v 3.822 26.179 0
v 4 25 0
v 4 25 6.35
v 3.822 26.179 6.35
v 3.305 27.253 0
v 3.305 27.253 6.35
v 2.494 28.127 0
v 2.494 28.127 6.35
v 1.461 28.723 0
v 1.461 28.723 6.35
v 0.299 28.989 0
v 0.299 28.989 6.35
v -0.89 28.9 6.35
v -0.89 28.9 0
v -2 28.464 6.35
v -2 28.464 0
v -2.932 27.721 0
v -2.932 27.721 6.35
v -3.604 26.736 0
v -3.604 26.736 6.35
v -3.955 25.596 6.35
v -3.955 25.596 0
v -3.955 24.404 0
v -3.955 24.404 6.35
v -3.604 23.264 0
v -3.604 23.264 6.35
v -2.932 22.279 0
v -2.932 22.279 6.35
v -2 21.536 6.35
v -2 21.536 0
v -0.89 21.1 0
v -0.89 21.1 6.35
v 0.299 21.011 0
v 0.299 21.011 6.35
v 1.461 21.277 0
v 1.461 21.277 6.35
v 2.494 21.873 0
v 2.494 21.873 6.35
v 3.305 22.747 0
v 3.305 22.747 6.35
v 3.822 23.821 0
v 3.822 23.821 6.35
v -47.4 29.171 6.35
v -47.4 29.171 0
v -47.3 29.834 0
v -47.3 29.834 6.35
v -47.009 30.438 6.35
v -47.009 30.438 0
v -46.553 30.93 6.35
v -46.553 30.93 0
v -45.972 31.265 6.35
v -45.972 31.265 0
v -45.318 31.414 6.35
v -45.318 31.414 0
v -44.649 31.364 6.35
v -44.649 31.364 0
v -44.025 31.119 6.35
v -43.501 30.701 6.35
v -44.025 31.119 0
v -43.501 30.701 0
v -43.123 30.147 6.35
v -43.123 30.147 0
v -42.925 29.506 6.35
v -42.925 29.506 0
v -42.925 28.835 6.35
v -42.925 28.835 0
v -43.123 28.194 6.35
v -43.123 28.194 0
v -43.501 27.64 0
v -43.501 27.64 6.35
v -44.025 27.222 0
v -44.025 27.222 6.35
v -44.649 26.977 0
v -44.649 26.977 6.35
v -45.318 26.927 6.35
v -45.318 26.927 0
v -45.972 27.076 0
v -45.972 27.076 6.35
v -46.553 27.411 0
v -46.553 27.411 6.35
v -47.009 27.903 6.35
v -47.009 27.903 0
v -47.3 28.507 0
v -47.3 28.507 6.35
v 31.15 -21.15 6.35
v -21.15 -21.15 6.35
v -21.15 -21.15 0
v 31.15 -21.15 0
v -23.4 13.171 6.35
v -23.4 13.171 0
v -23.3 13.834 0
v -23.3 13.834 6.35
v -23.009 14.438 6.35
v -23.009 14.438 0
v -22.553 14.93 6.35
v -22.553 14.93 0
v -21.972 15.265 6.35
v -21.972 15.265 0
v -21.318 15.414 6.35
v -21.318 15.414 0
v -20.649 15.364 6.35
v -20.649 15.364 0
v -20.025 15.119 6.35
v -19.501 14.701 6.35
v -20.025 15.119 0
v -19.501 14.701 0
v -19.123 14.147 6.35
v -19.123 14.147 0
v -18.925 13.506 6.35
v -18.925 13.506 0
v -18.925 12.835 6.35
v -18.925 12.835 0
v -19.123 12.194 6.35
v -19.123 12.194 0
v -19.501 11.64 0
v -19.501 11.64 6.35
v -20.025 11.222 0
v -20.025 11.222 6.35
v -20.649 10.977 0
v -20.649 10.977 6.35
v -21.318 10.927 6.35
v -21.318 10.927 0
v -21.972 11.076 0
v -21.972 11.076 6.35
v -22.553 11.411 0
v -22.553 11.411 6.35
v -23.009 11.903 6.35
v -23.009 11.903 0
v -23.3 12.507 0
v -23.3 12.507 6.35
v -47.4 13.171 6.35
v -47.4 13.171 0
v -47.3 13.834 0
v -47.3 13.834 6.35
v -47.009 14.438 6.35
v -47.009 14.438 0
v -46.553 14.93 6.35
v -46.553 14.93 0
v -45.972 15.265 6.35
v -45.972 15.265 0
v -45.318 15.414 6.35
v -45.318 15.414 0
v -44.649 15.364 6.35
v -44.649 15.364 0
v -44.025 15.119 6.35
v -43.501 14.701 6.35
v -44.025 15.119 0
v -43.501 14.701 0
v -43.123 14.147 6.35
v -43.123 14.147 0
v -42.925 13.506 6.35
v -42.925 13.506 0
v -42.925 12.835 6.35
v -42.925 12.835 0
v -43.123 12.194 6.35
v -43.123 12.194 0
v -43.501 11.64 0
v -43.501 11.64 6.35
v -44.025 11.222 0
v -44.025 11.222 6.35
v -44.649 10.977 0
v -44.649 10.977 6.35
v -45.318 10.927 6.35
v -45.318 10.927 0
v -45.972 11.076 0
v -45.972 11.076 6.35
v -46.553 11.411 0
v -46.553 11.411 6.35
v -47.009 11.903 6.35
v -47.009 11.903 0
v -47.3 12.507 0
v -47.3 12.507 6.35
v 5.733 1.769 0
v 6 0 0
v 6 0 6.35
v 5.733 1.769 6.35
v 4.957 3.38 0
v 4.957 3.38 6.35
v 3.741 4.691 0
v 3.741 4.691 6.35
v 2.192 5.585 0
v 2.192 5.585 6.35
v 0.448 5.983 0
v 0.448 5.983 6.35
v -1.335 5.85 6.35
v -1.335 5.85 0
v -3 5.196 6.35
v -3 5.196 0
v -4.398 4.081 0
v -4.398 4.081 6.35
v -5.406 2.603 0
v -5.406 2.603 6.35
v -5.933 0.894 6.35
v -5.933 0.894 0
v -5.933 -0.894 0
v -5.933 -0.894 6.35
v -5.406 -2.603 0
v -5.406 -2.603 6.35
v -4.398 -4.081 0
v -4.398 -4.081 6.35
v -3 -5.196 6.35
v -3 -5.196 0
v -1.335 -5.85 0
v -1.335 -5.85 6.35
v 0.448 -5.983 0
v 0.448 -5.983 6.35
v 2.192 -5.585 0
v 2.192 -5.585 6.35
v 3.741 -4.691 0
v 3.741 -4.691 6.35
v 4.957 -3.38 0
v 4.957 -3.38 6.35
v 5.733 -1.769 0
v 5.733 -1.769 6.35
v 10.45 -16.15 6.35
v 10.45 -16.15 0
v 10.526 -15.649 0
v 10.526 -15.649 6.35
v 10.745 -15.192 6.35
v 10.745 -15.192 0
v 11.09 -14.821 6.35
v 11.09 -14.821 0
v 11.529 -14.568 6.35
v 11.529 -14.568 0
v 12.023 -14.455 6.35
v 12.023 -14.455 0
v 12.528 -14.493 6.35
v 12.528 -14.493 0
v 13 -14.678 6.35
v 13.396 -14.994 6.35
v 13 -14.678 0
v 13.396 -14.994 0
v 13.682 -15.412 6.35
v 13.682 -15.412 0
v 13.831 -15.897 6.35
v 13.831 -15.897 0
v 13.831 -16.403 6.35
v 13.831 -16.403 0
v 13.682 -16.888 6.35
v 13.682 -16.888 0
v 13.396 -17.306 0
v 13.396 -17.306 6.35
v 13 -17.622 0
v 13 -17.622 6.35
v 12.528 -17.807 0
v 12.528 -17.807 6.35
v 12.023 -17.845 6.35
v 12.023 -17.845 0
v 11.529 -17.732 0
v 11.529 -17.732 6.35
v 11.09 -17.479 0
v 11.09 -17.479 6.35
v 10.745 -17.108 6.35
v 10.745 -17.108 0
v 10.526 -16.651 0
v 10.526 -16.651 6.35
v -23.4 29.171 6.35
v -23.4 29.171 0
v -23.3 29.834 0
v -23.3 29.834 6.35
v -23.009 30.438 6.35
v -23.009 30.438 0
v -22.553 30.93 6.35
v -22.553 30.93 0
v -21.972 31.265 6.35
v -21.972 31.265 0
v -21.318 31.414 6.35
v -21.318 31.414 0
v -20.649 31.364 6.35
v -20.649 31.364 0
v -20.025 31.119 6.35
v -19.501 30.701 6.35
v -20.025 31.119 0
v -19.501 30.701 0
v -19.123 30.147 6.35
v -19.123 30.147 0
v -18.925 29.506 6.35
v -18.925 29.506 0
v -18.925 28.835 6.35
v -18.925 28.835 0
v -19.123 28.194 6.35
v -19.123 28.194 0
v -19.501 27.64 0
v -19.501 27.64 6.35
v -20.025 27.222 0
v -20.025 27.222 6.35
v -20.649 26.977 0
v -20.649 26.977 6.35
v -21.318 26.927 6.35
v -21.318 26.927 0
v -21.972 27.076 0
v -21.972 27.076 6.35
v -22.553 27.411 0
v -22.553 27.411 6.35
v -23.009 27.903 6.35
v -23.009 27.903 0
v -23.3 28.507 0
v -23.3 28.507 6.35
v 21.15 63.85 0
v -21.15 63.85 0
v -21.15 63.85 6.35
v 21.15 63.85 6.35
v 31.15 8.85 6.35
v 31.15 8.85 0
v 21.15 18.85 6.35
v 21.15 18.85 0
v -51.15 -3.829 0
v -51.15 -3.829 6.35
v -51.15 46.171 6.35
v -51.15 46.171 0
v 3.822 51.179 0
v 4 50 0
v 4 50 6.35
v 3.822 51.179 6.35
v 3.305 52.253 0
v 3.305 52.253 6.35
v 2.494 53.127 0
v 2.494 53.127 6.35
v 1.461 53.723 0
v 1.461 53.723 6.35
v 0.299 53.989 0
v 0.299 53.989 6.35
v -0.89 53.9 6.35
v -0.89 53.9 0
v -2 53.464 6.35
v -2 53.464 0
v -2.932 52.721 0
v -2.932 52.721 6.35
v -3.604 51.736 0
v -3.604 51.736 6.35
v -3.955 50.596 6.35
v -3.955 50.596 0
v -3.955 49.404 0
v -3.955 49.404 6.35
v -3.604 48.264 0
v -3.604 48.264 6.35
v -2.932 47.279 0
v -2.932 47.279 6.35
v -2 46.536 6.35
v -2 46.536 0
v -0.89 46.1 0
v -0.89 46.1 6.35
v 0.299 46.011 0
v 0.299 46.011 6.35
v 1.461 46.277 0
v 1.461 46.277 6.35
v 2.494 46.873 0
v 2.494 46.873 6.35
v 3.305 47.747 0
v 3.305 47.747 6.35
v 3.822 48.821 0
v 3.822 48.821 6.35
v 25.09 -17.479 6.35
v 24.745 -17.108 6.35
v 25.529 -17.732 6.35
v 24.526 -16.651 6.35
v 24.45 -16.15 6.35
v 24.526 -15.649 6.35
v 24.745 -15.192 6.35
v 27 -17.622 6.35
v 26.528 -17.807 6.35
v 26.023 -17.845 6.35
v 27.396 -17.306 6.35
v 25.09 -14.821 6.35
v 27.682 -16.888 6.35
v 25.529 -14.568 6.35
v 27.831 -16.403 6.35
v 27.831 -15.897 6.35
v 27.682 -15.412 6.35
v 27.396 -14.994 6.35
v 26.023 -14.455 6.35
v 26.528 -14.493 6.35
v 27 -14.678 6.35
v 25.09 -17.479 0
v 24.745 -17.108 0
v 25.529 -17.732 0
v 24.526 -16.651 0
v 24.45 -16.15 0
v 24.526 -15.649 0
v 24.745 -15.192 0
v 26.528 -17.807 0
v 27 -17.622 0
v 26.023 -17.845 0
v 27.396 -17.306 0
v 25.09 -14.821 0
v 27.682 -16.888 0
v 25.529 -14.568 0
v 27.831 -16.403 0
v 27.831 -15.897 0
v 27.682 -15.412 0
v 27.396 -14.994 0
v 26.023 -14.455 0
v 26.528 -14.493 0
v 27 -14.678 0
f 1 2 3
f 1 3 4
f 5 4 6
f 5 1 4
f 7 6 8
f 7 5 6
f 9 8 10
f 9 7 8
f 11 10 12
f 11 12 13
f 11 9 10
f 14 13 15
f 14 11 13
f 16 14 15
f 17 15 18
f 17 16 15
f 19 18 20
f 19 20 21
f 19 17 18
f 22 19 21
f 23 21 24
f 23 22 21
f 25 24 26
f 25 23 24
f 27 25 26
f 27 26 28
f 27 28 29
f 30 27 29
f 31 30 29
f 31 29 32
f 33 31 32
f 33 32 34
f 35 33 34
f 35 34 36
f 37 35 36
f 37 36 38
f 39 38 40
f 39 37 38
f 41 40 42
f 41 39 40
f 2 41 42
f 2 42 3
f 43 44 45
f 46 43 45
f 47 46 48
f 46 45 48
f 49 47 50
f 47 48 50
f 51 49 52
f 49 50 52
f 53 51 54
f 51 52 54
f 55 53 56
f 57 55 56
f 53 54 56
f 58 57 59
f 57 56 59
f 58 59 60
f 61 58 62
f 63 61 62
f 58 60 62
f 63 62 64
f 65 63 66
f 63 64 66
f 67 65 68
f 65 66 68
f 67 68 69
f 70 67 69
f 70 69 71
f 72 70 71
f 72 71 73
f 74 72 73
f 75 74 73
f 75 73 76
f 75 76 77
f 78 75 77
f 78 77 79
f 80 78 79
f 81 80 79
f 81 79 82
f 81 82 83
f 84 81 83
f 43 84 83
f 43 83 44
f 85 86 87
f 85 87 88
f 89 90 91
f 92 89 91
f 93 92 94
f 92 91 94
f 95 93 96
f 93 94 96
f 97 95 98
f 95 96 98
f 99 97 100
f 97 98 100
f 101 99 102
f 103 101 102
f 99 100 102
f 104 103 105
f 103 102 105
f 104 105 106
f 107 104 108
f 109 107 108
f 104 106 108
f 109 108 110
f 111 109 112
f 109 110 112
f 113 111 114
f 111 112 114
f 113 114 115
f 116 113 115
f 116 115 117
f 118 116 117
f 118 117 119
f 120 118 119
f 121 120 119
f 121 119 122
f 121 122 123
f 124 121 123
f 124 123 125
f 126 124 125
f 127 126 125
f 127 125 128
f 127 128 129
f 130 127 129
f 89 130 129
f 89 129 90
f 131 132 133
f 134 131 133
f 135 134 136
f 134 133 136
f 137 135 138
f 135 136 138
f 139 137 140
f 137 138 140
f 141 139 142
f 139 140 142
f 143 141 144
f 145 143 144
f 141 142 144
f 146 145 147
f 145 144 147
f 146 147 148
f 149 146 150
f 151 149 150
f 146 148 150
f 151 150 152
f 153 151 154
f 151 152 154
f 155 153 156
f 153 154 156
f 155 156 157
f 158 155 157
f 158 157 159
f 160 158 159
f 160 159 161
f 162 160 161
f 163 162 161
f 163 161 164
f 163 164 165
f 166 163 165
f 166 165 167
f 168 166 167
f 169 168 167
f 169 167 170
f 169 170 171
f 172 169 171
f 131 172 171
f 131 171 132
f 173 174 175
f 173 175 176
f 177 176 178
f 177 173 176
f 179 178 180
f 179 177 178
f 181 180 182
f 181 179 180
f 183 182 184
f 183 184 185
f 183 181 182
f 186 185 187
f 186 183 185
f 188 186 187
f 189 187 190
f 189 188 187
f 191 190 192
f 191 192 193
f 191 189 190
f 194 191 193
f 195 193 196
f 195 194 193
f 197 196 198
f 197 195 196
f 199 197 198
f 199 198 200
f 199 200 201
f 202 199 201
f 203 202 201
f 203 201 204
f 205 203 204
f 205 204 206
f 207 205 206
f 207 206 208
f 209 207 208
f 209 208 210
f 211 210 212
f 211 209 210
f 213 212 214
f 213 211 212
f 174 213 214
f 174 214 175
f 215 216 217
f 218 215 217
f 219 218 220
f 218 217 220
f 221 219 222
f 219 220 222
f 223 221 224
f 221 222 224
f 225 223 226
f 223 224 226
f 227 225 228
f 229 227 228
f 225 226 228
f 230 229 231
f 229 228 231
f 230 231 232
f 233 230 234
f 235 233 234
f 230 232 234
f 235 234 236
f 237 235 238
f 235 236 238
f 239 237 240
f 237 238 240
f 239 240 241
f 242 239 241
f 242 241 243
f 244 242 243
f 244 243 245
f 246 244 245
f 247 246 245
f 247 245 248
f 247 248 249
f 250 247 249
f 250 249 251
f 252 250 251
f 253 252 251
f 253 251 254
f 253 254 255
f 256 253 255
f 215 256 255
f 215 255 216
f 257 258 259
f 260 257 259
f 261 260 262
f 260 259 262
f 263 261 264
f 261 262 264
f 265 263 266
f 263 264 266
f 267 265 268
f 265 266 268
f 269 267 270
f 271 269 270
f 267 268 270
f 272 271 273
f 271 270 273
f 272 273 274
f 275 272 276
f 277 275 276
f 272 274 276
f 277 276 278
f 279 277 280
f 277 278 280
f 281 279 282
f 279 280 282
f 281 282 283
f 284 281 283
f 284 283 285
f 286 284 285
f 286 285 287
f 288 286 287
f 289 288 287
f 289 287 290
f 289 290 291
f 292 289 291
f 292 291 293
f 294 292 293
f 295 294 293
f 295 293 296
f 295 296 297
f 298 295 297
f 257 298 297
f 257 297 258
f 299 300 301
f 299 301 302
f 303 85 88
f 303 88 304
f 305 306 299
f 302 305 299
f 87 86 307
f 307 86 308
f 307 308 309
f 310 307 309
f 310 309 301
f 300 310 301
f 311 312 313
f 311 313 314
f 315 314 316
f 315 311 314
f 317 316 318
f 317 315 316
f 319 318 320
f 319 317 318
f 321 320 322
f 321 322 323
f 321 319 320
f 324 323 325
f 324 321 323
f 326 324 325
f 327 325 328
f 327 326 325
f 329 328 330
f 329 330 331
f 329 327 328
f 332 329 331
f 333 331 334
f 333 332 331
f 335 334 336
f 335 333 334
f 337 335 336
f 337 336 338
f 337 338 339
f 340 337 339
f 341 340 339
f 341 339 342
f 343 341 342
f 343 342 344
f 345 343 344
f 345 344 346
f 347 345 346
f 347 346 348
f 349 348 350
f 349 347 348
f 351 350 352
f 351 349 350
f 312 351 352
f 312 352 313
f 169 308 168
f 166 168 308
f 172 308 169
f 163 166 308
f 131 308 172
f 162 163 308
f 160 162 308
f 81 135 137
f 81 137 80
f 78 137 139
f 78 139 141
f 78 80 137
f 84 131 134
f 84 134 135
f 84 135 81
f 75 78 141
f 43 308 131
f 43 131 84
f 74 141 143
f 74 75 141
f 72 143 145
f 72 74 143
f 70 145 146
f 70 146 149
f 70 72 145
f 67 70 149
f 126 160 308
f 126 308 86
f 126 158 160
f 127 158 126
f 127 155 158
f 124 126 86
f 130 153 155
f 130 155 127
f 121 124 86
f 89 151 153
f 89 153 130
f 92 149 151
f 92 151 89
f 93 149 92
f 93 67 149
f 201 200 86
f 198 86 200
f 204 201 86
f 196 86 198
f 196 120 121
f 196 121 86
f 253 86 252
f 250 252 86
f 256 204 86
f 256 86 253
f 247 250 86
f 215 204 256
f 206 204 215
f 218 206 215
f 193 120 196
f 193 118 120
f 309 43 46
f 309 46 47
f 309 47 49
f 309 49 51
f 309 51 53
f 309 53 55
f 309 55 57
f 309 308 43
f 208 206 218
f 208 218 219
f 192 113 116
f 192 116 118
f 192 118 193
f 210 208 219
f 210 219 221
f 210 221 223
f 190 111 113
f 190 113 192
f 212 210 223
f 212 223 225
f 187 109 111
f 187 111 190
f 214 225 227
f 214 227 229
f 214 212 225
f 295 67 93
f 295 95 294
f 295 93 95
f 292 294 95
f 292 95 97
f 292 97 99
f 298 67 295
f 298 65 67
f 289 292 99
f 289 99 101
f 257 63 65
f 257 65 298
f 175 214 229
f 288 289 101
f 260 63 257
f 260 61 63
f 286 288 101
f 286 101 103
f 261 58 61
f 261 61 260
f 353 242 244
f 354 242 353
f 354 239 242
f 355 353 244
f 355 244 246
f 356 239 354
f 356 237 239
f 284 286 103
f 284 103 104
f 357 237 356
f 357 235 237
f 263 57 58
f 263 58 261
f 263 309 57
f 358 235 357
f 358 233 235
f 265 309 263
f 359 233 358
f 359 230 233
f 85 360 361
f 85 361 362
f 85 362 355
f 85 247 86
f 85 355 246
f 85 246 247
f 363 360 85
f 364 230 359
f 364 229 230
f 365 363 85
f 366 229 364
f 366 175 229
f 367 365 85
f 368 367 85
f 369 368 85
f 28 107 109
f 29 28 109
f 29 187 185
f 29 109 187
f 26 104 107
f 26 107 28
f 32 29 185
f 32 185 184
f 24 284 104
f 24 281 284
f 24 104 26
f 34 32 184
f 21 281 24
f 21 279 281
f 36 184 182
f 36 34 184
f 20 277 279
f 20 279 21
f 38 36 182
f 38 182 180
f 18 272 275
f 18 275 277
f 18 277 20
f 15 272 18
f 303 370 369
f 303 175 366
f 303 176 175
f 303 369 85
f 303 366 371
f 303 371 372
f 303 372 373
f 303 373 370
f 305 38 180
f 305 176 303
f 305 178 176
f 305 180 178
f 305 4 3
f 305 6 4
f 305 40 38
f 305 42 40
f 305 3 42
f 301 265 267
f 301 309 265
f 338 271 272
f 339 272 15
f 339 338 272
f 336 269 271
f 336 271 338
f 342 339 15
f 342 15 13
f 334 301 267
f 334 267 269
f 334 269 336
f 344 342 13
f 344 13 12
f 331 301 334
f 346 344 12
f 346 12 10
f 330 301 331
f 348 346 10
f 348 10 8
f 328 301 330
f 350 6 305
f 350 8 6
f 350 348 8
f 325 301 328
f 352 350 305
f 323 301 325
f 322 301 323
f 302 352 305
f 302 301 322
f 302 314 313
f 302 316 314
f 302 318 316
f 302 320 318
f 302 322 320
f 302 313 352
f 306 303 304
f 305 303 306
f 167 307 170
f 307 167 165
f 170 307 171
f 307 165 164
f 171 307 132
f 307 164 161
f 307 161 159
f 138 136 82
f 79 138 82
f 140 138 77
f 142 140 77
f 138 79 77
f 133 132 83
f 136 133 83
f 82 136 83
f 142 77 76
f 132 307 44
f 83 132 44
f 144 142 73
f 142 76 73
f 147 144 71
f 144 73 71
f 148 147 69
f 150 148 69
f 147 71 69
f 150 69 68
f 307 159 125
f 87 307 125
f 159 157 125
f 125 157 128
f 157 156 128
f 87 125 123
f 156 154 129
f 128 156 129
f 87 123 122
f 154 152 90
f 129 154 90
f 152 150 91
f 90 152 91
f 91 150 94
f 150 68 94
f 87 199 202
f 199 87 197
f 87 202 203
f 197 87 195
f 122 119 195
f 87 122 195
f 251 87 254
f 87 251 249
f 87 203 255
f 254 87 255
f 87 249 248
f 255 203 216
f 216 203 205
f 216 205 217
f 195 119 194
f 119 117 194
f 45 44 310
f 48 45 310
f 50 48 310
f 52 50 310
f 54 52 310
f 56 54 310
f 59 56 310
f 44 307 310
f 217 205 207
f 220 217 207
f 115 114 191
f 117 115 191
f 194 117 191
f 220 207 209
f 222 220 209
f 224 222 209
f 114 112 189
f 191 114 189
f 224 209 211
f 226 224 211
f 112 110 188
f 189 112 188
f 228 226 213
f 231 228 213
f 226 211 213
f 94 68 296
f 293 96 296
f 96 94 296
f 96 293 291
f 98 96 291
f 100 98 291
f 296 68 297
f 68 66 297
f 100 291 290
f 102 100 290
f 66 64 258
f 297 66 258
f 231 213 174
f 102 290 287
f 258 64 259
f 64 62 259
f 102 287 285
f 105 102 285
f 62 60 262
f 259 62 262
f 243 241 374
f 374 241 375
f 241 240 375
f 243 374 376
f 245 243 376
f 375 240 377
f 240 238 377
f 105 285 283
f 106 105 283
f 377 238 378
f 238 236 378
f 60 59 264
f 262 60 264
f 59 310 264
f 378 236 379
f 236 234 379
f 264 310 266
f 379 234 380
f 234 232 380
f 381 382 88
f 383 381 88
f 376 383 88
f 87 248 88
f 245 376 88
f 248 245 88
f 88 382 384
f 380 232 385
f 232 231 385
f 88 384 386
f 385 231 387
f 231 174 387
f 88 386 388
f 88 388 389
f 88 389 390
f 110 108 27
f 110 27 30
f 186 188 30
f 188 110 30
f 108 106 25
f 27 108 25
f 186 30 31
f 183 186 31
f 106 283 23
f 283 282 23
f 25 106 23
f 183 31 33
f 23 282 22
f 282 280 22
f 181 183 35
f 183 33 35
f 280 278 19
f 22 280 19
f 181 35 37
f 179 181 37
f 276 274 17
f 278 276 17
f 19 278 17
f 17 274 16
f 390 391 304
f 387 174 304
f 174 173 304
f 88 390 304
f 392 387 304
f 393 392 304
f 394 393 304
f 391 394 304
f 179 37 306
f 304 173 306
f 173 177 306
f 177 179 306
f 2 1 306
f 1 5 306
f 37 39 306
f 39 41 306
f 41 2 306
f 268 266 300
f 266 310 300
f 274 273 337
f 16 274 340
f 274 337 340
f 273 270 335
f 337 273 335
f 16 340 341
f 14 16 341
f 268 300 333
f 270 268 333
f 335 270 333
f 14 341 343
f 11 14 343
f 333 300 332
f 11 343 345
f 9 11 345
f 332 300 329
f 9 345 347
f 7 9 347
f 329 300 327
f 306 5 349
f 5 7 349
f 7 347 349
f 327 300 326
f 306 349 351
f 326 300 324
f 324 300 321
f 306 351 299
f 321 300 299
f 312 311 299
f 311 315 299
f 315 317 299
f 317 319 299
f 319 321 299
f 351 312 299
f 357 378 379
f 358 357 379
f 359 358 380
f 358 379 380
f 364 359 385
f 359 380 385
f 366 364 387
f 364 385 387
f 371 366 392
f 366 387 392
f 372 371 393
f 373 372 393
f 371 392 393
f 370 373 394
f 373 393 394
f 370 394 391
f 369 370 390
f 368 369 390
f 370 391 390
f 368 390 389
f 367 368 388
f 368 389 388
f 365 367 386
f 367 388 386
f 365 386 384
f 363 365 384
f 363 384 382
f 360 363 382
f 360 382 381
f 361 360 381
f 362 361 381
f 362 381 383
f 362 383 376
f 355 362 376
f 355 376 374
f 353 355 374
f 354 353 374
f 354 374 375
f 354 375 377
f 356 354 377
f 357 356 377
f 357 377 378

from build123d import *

# Parameters (mm, degrees)
SKETCH2_W            = 42.3
SKETCH2_H            = 85
SKETCH2_R            = 6
SKETCH2_R_2          = 4
BOSS_EXTRUDE1_DEPTH  = 6.35
BOSS_EXTRUDE2_DEPTH  = 6.35
M4_CLEARANCE_HOLE1_D = 4.5
BOSS_EXTRUDE3_DEPTH  = 6.35
M3_CLEARANCE_HOLE2_D = 3.4


with BuildPart() as part:
    # Sketch2 → Boss-Extrude1 (new body)
    with BuildSketch(Plane.XY):
        with Locations((0, 21.35)):
            Rectangle(SKETCH2_W, SKETCH2_H)
        Circle(SKETCH2_R, mode=Mode.SUBTRACT)
        with Locations((0, 25)):
            Circle(SKETCH2_R_2, mode=Mode.SUBTRACT)
        with Locations((0, 50)):
            Circle(SKETCH2_R_2, mode=Mode.SUBTRACT)
    extrude(amount=BOSS_EXTRUDE1_DEPTH)

    # Sketch8 → Boss-Extrude2 (add)
    with BuildSketch(Plane.XY.offset(6.35)):
        Polygon((-21.15, -21.15), (-51.15, -3.829491924), (-51.15, 46.170508076), (-21.15, 63.85), align=None)
    extrude(amount=-BOSS_EXTRUDE2_DEPTH)

    # M4 Clearance Hole1 (through all)
    with Locations(Plane.XY.offset(6.35)):
        with Locations((-21.15, 13.170508076), (-21.15, 29.170508076), (-45.15, 13.170508076), (-45.15, 29.170508076)):
            Hole(M4_CLEARANCE_HOLE1_D / 2)

    # Sketch11 → Boss-Extrude3 (add)
    with BuildSketch(Plane.XY.offset(6.35)):
        Polygon((21.15, -21.15), (31.15, -21.15), (31.15, 8.85), (21.15, 18.85), align=None)
    extrude(amount=-BOSS_EXTRUDE3_DEPTH)

    # M3 Clearance Hole2 (through all)
    with Locations(Plane.XY.offset(6.35)):
        with Locations((12.15, -16.15), (26.15, -16.15)):
            Hole(M3_CLEARANCE_HOLE2_D / 2)


solid = part.part
